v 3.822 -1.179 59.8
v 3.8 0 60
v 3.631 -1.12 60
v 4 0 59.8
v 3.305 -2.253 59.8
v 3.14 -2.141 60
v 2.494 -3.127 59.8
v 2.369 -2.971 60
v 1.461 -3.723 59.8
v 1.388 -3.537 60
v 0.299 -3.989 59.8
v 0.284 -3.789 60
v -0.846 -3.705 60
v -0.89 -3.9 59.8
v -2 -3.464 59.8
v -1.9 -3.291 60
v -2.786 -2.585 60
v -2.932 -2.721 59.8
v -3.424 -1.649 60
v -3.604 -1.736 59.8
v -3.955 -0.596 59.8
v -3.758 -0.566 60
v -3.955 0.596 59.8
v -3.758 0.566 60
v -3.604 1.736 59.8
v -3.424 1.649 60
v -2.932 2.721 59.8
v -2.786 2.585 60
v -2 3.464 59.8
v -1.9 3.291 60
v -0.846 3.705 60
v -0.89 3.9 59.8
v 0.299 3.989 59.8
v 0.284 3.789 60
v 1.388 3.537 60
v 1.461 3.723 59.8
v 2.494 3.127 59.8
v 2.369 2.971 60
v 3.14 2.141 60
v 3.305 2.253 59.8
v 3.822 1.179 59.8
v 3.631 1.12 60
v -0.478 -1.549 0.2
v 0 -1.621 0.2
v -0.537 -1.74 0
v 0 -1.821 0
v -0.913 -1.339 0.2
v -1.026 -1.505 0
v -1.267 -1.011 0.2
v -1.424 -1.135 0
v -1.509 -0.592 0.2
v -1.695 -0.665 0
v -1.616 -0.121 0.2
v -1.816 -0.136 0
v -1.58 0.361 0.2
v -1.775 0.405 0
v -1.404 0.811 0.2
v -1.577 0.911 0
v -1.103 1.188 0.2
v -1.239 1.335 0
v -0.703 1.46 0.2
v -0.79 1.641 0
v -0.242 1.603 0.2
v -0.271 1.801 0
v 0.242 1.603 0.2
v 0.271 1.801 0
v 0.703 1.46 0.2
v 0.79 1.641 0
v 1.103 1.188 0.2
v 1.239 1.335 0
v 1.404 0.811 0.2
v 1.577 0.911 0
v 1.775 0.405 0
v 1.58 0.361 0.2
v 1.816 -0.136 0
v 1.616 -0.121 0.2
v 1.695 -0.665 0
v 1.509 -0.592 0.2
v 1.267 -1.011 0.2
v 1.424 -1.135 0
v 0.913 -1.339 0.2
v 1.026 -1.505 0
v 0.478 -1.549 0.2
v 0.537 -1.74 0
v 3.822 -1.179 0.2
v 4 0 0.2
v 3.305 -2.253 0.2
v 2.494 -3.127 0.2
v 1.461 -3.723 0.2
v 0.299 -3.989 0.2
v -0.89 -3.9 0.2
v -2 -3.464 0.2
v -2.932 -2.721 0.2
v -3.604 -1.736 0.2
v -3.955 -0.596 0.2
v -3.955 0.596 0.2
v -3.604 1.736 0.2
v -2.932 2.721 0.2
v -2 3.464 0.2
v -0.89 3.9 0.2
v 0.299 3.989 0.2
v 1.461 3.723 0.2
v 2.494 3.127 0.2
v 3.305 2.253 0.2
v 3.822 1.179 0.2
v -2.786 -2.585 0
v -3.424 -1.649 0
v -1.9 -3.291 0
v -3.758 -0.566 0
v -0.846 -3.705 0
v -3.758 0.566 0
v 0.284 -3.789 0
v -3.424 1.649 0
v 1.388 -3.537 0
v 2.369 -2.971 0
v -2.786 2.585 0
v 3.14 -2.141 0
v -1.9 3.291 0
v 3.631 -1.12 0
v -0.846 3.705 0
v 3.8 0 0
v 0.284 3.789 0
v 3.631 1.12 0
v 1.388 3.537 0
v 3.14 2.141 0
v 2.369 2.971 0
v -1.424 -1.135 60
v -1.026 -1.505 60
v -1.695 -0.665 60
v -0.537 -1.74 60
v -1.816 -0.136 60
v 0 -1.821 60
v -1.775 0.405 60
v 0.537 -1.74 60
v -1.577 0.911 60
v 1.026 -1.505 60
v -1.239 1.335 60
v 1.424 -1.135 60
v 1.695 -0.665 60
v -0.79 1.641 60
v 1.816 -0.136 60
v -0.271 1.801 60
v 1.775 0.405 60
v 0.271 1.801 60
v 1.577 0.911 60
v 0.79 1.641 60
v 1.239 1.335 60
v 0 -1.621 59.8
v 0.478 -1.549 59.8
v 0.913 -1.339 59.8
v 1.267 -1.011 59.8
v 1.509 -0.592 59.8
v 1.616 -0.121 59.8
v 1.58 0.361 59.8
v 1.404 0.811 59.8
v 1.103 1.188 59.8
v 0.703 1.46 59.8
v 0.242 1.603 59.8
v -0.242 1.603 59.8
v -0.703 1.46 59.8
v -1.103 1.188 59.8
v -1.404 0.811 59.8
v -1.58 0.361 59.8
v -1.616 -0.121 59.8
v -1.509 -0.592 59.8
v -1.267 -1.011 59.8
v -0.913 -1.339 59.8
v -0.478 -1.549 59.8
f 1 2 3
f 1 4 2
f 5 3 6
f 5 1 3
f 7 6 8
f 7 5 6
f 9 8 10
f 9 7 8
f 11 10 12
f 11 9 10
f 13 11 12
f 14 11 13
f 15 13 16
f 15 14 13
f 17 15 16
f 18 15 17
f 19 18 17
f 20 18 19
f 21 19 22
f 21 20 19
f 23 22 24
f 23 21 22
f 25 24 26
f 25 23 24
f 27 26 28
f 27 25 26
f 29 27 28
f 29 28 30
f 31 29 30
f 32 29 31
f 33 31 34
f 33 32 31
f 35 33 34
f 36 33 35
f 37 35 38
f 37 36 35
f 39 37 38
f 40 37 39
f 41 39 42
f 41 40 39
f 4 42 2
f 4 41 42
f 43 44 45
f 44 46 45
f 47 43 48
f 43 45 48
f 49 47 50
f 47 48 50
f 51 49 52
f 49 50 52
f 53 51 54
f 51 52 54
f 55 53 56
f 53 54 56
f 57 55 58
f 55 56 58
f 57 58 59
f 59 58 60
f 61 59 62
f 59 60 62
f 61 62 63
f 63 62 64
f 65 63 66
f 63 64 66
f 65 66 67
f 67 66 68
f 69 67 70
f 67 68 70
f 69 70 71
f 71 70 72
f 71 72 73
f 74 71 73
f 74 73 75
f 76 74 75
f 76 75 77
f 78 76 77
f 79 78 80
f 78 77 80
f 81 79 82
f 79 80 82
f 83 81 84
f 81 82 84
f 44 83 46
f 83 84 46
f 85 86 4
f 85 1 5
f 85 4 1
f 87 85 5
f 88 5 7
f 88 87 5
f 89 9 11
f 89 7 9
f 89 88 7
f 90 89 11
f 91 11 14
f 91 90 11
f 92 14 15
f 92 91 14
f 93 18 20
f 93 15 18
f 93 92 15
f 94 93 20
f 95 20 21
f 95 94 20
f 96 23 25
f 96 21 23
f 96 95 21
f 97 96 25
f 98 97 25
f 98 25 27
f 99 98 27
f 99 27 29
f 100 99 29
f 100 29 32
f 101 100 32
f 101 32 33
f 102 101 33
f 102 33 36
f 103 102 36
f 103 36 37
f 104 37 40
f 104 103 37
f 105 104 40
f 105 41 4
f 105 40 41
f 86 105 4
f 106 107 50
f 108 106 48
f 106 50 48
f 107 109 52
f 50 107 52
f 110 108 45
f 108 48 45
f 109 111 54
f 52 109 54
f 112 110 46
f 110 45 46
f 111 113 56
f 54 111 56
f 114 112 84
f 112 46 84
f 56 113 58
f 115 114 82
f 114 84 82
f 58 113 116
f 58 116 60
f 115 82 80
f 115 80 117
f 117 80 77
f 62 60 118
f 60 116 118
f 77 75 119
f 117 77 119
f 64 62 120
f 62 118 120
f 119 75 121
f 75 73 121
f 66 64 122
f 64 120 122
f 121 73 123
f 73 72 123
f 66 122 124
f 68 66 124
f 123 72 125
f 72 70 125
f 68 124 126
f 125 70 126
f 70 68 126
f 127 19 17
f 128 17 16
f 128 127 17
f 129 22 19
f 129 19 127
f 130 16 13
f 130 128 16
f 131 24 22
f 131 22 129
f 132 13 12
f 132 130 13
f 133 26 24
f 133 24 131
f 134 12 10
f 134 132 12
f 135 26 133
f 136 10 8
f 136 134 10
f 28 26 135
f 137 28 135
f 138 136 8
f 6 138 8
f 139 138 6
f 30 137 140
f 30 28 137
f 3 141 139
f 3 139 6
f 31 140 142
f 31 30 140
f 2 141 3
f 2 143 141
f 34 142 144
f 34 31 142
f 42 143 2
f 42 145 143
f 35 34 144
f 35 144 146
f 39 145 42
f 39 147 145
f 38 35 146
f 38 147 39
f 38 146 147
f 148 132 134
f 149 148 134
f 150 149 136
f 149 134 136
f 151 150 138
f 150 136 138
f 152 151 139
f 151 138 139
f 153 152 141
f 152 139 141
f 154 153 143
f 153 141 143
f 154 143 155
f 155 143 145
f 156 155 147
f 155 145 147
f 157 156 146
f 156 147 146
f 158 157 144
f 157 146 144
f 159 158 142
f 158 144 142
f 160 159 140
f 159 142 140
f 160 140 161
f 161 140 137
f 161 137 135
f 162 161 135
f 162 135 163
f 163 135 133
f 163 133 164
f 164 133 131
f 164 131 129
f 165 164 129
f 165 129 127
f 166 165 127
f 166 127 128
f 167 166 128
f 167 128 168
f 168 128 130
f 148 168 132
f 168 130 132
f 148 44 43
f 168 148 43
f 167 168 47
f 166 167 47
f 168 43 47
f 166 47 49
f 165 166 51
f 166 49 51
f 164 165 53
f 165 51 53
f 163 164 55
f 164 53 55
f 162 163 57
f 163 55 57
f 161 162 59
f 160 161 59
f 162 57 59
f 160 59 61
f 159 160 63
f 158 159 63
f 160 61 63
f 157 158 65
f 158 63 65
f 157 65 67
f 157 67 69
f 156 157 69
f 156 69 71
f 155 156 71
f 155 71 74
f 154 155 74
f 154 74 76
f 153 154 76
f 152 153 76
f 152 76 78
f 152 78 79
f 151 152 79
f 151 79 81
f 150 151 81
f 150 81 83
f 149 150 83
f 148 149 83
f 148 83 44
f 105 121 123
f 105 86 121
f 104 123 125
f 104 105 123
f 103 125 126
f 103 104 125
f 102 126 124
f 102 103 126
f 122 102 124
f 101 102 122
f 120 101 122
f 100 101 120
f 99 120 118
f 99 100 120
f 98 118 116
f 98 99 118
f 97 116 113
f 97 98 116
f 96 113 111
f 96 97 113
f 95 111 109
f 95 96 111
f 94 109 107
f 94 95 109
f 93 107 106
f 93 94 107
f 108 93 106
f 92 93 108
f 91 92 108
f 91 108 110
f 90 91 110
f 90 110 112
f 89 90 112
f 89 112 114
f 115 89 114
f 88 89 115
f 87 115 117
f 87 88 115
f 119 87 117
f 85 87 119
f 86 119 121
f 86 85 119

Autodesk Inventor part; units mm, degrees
ref_plane "YZ Plane" through (0, 0, 0) normal (1, 0, 0) x (0, 1, 0)
ref_plane "XZ Plane" through (0, 0, 0) normal (0, 1, 0) x (-1, 0, 0)
ref_plane "XY Plane" through (0, 0, 0) normal (0, 0, 1) x (1, 0, 0)
sketch "スケッチ1" plane through (0, 0, 0) normal (0, 0, 1) x (1, 0, 0)
  circle A0 centre (0, 0) radius 4
  dimension "d13" = 8
extrude "押し出し1" add sketch "スケッチ1" along normal blind 60
sketch "スケッチ2" plane through (0, 0, 60) normal (0, 0, 1) x (1, 0, 0)
  point P0 (0, 0)
  point P1 (0, 0)
hole "穴1" at (0, 0, 60) direction (0, 0, -1) diameter 3.242 end through all thread size "M4x0.7" class "6H" standard "ANSI Metric M Profile"
chamfer "面取り1" distance 0.2 angle 45 4 edges at (0, 1.621, 60) (0, 1.621, 0) (-4, 0, 60) (-4, 0, 0)
properties part number "ARF-4_1" material "鋼、炭素鋼"
